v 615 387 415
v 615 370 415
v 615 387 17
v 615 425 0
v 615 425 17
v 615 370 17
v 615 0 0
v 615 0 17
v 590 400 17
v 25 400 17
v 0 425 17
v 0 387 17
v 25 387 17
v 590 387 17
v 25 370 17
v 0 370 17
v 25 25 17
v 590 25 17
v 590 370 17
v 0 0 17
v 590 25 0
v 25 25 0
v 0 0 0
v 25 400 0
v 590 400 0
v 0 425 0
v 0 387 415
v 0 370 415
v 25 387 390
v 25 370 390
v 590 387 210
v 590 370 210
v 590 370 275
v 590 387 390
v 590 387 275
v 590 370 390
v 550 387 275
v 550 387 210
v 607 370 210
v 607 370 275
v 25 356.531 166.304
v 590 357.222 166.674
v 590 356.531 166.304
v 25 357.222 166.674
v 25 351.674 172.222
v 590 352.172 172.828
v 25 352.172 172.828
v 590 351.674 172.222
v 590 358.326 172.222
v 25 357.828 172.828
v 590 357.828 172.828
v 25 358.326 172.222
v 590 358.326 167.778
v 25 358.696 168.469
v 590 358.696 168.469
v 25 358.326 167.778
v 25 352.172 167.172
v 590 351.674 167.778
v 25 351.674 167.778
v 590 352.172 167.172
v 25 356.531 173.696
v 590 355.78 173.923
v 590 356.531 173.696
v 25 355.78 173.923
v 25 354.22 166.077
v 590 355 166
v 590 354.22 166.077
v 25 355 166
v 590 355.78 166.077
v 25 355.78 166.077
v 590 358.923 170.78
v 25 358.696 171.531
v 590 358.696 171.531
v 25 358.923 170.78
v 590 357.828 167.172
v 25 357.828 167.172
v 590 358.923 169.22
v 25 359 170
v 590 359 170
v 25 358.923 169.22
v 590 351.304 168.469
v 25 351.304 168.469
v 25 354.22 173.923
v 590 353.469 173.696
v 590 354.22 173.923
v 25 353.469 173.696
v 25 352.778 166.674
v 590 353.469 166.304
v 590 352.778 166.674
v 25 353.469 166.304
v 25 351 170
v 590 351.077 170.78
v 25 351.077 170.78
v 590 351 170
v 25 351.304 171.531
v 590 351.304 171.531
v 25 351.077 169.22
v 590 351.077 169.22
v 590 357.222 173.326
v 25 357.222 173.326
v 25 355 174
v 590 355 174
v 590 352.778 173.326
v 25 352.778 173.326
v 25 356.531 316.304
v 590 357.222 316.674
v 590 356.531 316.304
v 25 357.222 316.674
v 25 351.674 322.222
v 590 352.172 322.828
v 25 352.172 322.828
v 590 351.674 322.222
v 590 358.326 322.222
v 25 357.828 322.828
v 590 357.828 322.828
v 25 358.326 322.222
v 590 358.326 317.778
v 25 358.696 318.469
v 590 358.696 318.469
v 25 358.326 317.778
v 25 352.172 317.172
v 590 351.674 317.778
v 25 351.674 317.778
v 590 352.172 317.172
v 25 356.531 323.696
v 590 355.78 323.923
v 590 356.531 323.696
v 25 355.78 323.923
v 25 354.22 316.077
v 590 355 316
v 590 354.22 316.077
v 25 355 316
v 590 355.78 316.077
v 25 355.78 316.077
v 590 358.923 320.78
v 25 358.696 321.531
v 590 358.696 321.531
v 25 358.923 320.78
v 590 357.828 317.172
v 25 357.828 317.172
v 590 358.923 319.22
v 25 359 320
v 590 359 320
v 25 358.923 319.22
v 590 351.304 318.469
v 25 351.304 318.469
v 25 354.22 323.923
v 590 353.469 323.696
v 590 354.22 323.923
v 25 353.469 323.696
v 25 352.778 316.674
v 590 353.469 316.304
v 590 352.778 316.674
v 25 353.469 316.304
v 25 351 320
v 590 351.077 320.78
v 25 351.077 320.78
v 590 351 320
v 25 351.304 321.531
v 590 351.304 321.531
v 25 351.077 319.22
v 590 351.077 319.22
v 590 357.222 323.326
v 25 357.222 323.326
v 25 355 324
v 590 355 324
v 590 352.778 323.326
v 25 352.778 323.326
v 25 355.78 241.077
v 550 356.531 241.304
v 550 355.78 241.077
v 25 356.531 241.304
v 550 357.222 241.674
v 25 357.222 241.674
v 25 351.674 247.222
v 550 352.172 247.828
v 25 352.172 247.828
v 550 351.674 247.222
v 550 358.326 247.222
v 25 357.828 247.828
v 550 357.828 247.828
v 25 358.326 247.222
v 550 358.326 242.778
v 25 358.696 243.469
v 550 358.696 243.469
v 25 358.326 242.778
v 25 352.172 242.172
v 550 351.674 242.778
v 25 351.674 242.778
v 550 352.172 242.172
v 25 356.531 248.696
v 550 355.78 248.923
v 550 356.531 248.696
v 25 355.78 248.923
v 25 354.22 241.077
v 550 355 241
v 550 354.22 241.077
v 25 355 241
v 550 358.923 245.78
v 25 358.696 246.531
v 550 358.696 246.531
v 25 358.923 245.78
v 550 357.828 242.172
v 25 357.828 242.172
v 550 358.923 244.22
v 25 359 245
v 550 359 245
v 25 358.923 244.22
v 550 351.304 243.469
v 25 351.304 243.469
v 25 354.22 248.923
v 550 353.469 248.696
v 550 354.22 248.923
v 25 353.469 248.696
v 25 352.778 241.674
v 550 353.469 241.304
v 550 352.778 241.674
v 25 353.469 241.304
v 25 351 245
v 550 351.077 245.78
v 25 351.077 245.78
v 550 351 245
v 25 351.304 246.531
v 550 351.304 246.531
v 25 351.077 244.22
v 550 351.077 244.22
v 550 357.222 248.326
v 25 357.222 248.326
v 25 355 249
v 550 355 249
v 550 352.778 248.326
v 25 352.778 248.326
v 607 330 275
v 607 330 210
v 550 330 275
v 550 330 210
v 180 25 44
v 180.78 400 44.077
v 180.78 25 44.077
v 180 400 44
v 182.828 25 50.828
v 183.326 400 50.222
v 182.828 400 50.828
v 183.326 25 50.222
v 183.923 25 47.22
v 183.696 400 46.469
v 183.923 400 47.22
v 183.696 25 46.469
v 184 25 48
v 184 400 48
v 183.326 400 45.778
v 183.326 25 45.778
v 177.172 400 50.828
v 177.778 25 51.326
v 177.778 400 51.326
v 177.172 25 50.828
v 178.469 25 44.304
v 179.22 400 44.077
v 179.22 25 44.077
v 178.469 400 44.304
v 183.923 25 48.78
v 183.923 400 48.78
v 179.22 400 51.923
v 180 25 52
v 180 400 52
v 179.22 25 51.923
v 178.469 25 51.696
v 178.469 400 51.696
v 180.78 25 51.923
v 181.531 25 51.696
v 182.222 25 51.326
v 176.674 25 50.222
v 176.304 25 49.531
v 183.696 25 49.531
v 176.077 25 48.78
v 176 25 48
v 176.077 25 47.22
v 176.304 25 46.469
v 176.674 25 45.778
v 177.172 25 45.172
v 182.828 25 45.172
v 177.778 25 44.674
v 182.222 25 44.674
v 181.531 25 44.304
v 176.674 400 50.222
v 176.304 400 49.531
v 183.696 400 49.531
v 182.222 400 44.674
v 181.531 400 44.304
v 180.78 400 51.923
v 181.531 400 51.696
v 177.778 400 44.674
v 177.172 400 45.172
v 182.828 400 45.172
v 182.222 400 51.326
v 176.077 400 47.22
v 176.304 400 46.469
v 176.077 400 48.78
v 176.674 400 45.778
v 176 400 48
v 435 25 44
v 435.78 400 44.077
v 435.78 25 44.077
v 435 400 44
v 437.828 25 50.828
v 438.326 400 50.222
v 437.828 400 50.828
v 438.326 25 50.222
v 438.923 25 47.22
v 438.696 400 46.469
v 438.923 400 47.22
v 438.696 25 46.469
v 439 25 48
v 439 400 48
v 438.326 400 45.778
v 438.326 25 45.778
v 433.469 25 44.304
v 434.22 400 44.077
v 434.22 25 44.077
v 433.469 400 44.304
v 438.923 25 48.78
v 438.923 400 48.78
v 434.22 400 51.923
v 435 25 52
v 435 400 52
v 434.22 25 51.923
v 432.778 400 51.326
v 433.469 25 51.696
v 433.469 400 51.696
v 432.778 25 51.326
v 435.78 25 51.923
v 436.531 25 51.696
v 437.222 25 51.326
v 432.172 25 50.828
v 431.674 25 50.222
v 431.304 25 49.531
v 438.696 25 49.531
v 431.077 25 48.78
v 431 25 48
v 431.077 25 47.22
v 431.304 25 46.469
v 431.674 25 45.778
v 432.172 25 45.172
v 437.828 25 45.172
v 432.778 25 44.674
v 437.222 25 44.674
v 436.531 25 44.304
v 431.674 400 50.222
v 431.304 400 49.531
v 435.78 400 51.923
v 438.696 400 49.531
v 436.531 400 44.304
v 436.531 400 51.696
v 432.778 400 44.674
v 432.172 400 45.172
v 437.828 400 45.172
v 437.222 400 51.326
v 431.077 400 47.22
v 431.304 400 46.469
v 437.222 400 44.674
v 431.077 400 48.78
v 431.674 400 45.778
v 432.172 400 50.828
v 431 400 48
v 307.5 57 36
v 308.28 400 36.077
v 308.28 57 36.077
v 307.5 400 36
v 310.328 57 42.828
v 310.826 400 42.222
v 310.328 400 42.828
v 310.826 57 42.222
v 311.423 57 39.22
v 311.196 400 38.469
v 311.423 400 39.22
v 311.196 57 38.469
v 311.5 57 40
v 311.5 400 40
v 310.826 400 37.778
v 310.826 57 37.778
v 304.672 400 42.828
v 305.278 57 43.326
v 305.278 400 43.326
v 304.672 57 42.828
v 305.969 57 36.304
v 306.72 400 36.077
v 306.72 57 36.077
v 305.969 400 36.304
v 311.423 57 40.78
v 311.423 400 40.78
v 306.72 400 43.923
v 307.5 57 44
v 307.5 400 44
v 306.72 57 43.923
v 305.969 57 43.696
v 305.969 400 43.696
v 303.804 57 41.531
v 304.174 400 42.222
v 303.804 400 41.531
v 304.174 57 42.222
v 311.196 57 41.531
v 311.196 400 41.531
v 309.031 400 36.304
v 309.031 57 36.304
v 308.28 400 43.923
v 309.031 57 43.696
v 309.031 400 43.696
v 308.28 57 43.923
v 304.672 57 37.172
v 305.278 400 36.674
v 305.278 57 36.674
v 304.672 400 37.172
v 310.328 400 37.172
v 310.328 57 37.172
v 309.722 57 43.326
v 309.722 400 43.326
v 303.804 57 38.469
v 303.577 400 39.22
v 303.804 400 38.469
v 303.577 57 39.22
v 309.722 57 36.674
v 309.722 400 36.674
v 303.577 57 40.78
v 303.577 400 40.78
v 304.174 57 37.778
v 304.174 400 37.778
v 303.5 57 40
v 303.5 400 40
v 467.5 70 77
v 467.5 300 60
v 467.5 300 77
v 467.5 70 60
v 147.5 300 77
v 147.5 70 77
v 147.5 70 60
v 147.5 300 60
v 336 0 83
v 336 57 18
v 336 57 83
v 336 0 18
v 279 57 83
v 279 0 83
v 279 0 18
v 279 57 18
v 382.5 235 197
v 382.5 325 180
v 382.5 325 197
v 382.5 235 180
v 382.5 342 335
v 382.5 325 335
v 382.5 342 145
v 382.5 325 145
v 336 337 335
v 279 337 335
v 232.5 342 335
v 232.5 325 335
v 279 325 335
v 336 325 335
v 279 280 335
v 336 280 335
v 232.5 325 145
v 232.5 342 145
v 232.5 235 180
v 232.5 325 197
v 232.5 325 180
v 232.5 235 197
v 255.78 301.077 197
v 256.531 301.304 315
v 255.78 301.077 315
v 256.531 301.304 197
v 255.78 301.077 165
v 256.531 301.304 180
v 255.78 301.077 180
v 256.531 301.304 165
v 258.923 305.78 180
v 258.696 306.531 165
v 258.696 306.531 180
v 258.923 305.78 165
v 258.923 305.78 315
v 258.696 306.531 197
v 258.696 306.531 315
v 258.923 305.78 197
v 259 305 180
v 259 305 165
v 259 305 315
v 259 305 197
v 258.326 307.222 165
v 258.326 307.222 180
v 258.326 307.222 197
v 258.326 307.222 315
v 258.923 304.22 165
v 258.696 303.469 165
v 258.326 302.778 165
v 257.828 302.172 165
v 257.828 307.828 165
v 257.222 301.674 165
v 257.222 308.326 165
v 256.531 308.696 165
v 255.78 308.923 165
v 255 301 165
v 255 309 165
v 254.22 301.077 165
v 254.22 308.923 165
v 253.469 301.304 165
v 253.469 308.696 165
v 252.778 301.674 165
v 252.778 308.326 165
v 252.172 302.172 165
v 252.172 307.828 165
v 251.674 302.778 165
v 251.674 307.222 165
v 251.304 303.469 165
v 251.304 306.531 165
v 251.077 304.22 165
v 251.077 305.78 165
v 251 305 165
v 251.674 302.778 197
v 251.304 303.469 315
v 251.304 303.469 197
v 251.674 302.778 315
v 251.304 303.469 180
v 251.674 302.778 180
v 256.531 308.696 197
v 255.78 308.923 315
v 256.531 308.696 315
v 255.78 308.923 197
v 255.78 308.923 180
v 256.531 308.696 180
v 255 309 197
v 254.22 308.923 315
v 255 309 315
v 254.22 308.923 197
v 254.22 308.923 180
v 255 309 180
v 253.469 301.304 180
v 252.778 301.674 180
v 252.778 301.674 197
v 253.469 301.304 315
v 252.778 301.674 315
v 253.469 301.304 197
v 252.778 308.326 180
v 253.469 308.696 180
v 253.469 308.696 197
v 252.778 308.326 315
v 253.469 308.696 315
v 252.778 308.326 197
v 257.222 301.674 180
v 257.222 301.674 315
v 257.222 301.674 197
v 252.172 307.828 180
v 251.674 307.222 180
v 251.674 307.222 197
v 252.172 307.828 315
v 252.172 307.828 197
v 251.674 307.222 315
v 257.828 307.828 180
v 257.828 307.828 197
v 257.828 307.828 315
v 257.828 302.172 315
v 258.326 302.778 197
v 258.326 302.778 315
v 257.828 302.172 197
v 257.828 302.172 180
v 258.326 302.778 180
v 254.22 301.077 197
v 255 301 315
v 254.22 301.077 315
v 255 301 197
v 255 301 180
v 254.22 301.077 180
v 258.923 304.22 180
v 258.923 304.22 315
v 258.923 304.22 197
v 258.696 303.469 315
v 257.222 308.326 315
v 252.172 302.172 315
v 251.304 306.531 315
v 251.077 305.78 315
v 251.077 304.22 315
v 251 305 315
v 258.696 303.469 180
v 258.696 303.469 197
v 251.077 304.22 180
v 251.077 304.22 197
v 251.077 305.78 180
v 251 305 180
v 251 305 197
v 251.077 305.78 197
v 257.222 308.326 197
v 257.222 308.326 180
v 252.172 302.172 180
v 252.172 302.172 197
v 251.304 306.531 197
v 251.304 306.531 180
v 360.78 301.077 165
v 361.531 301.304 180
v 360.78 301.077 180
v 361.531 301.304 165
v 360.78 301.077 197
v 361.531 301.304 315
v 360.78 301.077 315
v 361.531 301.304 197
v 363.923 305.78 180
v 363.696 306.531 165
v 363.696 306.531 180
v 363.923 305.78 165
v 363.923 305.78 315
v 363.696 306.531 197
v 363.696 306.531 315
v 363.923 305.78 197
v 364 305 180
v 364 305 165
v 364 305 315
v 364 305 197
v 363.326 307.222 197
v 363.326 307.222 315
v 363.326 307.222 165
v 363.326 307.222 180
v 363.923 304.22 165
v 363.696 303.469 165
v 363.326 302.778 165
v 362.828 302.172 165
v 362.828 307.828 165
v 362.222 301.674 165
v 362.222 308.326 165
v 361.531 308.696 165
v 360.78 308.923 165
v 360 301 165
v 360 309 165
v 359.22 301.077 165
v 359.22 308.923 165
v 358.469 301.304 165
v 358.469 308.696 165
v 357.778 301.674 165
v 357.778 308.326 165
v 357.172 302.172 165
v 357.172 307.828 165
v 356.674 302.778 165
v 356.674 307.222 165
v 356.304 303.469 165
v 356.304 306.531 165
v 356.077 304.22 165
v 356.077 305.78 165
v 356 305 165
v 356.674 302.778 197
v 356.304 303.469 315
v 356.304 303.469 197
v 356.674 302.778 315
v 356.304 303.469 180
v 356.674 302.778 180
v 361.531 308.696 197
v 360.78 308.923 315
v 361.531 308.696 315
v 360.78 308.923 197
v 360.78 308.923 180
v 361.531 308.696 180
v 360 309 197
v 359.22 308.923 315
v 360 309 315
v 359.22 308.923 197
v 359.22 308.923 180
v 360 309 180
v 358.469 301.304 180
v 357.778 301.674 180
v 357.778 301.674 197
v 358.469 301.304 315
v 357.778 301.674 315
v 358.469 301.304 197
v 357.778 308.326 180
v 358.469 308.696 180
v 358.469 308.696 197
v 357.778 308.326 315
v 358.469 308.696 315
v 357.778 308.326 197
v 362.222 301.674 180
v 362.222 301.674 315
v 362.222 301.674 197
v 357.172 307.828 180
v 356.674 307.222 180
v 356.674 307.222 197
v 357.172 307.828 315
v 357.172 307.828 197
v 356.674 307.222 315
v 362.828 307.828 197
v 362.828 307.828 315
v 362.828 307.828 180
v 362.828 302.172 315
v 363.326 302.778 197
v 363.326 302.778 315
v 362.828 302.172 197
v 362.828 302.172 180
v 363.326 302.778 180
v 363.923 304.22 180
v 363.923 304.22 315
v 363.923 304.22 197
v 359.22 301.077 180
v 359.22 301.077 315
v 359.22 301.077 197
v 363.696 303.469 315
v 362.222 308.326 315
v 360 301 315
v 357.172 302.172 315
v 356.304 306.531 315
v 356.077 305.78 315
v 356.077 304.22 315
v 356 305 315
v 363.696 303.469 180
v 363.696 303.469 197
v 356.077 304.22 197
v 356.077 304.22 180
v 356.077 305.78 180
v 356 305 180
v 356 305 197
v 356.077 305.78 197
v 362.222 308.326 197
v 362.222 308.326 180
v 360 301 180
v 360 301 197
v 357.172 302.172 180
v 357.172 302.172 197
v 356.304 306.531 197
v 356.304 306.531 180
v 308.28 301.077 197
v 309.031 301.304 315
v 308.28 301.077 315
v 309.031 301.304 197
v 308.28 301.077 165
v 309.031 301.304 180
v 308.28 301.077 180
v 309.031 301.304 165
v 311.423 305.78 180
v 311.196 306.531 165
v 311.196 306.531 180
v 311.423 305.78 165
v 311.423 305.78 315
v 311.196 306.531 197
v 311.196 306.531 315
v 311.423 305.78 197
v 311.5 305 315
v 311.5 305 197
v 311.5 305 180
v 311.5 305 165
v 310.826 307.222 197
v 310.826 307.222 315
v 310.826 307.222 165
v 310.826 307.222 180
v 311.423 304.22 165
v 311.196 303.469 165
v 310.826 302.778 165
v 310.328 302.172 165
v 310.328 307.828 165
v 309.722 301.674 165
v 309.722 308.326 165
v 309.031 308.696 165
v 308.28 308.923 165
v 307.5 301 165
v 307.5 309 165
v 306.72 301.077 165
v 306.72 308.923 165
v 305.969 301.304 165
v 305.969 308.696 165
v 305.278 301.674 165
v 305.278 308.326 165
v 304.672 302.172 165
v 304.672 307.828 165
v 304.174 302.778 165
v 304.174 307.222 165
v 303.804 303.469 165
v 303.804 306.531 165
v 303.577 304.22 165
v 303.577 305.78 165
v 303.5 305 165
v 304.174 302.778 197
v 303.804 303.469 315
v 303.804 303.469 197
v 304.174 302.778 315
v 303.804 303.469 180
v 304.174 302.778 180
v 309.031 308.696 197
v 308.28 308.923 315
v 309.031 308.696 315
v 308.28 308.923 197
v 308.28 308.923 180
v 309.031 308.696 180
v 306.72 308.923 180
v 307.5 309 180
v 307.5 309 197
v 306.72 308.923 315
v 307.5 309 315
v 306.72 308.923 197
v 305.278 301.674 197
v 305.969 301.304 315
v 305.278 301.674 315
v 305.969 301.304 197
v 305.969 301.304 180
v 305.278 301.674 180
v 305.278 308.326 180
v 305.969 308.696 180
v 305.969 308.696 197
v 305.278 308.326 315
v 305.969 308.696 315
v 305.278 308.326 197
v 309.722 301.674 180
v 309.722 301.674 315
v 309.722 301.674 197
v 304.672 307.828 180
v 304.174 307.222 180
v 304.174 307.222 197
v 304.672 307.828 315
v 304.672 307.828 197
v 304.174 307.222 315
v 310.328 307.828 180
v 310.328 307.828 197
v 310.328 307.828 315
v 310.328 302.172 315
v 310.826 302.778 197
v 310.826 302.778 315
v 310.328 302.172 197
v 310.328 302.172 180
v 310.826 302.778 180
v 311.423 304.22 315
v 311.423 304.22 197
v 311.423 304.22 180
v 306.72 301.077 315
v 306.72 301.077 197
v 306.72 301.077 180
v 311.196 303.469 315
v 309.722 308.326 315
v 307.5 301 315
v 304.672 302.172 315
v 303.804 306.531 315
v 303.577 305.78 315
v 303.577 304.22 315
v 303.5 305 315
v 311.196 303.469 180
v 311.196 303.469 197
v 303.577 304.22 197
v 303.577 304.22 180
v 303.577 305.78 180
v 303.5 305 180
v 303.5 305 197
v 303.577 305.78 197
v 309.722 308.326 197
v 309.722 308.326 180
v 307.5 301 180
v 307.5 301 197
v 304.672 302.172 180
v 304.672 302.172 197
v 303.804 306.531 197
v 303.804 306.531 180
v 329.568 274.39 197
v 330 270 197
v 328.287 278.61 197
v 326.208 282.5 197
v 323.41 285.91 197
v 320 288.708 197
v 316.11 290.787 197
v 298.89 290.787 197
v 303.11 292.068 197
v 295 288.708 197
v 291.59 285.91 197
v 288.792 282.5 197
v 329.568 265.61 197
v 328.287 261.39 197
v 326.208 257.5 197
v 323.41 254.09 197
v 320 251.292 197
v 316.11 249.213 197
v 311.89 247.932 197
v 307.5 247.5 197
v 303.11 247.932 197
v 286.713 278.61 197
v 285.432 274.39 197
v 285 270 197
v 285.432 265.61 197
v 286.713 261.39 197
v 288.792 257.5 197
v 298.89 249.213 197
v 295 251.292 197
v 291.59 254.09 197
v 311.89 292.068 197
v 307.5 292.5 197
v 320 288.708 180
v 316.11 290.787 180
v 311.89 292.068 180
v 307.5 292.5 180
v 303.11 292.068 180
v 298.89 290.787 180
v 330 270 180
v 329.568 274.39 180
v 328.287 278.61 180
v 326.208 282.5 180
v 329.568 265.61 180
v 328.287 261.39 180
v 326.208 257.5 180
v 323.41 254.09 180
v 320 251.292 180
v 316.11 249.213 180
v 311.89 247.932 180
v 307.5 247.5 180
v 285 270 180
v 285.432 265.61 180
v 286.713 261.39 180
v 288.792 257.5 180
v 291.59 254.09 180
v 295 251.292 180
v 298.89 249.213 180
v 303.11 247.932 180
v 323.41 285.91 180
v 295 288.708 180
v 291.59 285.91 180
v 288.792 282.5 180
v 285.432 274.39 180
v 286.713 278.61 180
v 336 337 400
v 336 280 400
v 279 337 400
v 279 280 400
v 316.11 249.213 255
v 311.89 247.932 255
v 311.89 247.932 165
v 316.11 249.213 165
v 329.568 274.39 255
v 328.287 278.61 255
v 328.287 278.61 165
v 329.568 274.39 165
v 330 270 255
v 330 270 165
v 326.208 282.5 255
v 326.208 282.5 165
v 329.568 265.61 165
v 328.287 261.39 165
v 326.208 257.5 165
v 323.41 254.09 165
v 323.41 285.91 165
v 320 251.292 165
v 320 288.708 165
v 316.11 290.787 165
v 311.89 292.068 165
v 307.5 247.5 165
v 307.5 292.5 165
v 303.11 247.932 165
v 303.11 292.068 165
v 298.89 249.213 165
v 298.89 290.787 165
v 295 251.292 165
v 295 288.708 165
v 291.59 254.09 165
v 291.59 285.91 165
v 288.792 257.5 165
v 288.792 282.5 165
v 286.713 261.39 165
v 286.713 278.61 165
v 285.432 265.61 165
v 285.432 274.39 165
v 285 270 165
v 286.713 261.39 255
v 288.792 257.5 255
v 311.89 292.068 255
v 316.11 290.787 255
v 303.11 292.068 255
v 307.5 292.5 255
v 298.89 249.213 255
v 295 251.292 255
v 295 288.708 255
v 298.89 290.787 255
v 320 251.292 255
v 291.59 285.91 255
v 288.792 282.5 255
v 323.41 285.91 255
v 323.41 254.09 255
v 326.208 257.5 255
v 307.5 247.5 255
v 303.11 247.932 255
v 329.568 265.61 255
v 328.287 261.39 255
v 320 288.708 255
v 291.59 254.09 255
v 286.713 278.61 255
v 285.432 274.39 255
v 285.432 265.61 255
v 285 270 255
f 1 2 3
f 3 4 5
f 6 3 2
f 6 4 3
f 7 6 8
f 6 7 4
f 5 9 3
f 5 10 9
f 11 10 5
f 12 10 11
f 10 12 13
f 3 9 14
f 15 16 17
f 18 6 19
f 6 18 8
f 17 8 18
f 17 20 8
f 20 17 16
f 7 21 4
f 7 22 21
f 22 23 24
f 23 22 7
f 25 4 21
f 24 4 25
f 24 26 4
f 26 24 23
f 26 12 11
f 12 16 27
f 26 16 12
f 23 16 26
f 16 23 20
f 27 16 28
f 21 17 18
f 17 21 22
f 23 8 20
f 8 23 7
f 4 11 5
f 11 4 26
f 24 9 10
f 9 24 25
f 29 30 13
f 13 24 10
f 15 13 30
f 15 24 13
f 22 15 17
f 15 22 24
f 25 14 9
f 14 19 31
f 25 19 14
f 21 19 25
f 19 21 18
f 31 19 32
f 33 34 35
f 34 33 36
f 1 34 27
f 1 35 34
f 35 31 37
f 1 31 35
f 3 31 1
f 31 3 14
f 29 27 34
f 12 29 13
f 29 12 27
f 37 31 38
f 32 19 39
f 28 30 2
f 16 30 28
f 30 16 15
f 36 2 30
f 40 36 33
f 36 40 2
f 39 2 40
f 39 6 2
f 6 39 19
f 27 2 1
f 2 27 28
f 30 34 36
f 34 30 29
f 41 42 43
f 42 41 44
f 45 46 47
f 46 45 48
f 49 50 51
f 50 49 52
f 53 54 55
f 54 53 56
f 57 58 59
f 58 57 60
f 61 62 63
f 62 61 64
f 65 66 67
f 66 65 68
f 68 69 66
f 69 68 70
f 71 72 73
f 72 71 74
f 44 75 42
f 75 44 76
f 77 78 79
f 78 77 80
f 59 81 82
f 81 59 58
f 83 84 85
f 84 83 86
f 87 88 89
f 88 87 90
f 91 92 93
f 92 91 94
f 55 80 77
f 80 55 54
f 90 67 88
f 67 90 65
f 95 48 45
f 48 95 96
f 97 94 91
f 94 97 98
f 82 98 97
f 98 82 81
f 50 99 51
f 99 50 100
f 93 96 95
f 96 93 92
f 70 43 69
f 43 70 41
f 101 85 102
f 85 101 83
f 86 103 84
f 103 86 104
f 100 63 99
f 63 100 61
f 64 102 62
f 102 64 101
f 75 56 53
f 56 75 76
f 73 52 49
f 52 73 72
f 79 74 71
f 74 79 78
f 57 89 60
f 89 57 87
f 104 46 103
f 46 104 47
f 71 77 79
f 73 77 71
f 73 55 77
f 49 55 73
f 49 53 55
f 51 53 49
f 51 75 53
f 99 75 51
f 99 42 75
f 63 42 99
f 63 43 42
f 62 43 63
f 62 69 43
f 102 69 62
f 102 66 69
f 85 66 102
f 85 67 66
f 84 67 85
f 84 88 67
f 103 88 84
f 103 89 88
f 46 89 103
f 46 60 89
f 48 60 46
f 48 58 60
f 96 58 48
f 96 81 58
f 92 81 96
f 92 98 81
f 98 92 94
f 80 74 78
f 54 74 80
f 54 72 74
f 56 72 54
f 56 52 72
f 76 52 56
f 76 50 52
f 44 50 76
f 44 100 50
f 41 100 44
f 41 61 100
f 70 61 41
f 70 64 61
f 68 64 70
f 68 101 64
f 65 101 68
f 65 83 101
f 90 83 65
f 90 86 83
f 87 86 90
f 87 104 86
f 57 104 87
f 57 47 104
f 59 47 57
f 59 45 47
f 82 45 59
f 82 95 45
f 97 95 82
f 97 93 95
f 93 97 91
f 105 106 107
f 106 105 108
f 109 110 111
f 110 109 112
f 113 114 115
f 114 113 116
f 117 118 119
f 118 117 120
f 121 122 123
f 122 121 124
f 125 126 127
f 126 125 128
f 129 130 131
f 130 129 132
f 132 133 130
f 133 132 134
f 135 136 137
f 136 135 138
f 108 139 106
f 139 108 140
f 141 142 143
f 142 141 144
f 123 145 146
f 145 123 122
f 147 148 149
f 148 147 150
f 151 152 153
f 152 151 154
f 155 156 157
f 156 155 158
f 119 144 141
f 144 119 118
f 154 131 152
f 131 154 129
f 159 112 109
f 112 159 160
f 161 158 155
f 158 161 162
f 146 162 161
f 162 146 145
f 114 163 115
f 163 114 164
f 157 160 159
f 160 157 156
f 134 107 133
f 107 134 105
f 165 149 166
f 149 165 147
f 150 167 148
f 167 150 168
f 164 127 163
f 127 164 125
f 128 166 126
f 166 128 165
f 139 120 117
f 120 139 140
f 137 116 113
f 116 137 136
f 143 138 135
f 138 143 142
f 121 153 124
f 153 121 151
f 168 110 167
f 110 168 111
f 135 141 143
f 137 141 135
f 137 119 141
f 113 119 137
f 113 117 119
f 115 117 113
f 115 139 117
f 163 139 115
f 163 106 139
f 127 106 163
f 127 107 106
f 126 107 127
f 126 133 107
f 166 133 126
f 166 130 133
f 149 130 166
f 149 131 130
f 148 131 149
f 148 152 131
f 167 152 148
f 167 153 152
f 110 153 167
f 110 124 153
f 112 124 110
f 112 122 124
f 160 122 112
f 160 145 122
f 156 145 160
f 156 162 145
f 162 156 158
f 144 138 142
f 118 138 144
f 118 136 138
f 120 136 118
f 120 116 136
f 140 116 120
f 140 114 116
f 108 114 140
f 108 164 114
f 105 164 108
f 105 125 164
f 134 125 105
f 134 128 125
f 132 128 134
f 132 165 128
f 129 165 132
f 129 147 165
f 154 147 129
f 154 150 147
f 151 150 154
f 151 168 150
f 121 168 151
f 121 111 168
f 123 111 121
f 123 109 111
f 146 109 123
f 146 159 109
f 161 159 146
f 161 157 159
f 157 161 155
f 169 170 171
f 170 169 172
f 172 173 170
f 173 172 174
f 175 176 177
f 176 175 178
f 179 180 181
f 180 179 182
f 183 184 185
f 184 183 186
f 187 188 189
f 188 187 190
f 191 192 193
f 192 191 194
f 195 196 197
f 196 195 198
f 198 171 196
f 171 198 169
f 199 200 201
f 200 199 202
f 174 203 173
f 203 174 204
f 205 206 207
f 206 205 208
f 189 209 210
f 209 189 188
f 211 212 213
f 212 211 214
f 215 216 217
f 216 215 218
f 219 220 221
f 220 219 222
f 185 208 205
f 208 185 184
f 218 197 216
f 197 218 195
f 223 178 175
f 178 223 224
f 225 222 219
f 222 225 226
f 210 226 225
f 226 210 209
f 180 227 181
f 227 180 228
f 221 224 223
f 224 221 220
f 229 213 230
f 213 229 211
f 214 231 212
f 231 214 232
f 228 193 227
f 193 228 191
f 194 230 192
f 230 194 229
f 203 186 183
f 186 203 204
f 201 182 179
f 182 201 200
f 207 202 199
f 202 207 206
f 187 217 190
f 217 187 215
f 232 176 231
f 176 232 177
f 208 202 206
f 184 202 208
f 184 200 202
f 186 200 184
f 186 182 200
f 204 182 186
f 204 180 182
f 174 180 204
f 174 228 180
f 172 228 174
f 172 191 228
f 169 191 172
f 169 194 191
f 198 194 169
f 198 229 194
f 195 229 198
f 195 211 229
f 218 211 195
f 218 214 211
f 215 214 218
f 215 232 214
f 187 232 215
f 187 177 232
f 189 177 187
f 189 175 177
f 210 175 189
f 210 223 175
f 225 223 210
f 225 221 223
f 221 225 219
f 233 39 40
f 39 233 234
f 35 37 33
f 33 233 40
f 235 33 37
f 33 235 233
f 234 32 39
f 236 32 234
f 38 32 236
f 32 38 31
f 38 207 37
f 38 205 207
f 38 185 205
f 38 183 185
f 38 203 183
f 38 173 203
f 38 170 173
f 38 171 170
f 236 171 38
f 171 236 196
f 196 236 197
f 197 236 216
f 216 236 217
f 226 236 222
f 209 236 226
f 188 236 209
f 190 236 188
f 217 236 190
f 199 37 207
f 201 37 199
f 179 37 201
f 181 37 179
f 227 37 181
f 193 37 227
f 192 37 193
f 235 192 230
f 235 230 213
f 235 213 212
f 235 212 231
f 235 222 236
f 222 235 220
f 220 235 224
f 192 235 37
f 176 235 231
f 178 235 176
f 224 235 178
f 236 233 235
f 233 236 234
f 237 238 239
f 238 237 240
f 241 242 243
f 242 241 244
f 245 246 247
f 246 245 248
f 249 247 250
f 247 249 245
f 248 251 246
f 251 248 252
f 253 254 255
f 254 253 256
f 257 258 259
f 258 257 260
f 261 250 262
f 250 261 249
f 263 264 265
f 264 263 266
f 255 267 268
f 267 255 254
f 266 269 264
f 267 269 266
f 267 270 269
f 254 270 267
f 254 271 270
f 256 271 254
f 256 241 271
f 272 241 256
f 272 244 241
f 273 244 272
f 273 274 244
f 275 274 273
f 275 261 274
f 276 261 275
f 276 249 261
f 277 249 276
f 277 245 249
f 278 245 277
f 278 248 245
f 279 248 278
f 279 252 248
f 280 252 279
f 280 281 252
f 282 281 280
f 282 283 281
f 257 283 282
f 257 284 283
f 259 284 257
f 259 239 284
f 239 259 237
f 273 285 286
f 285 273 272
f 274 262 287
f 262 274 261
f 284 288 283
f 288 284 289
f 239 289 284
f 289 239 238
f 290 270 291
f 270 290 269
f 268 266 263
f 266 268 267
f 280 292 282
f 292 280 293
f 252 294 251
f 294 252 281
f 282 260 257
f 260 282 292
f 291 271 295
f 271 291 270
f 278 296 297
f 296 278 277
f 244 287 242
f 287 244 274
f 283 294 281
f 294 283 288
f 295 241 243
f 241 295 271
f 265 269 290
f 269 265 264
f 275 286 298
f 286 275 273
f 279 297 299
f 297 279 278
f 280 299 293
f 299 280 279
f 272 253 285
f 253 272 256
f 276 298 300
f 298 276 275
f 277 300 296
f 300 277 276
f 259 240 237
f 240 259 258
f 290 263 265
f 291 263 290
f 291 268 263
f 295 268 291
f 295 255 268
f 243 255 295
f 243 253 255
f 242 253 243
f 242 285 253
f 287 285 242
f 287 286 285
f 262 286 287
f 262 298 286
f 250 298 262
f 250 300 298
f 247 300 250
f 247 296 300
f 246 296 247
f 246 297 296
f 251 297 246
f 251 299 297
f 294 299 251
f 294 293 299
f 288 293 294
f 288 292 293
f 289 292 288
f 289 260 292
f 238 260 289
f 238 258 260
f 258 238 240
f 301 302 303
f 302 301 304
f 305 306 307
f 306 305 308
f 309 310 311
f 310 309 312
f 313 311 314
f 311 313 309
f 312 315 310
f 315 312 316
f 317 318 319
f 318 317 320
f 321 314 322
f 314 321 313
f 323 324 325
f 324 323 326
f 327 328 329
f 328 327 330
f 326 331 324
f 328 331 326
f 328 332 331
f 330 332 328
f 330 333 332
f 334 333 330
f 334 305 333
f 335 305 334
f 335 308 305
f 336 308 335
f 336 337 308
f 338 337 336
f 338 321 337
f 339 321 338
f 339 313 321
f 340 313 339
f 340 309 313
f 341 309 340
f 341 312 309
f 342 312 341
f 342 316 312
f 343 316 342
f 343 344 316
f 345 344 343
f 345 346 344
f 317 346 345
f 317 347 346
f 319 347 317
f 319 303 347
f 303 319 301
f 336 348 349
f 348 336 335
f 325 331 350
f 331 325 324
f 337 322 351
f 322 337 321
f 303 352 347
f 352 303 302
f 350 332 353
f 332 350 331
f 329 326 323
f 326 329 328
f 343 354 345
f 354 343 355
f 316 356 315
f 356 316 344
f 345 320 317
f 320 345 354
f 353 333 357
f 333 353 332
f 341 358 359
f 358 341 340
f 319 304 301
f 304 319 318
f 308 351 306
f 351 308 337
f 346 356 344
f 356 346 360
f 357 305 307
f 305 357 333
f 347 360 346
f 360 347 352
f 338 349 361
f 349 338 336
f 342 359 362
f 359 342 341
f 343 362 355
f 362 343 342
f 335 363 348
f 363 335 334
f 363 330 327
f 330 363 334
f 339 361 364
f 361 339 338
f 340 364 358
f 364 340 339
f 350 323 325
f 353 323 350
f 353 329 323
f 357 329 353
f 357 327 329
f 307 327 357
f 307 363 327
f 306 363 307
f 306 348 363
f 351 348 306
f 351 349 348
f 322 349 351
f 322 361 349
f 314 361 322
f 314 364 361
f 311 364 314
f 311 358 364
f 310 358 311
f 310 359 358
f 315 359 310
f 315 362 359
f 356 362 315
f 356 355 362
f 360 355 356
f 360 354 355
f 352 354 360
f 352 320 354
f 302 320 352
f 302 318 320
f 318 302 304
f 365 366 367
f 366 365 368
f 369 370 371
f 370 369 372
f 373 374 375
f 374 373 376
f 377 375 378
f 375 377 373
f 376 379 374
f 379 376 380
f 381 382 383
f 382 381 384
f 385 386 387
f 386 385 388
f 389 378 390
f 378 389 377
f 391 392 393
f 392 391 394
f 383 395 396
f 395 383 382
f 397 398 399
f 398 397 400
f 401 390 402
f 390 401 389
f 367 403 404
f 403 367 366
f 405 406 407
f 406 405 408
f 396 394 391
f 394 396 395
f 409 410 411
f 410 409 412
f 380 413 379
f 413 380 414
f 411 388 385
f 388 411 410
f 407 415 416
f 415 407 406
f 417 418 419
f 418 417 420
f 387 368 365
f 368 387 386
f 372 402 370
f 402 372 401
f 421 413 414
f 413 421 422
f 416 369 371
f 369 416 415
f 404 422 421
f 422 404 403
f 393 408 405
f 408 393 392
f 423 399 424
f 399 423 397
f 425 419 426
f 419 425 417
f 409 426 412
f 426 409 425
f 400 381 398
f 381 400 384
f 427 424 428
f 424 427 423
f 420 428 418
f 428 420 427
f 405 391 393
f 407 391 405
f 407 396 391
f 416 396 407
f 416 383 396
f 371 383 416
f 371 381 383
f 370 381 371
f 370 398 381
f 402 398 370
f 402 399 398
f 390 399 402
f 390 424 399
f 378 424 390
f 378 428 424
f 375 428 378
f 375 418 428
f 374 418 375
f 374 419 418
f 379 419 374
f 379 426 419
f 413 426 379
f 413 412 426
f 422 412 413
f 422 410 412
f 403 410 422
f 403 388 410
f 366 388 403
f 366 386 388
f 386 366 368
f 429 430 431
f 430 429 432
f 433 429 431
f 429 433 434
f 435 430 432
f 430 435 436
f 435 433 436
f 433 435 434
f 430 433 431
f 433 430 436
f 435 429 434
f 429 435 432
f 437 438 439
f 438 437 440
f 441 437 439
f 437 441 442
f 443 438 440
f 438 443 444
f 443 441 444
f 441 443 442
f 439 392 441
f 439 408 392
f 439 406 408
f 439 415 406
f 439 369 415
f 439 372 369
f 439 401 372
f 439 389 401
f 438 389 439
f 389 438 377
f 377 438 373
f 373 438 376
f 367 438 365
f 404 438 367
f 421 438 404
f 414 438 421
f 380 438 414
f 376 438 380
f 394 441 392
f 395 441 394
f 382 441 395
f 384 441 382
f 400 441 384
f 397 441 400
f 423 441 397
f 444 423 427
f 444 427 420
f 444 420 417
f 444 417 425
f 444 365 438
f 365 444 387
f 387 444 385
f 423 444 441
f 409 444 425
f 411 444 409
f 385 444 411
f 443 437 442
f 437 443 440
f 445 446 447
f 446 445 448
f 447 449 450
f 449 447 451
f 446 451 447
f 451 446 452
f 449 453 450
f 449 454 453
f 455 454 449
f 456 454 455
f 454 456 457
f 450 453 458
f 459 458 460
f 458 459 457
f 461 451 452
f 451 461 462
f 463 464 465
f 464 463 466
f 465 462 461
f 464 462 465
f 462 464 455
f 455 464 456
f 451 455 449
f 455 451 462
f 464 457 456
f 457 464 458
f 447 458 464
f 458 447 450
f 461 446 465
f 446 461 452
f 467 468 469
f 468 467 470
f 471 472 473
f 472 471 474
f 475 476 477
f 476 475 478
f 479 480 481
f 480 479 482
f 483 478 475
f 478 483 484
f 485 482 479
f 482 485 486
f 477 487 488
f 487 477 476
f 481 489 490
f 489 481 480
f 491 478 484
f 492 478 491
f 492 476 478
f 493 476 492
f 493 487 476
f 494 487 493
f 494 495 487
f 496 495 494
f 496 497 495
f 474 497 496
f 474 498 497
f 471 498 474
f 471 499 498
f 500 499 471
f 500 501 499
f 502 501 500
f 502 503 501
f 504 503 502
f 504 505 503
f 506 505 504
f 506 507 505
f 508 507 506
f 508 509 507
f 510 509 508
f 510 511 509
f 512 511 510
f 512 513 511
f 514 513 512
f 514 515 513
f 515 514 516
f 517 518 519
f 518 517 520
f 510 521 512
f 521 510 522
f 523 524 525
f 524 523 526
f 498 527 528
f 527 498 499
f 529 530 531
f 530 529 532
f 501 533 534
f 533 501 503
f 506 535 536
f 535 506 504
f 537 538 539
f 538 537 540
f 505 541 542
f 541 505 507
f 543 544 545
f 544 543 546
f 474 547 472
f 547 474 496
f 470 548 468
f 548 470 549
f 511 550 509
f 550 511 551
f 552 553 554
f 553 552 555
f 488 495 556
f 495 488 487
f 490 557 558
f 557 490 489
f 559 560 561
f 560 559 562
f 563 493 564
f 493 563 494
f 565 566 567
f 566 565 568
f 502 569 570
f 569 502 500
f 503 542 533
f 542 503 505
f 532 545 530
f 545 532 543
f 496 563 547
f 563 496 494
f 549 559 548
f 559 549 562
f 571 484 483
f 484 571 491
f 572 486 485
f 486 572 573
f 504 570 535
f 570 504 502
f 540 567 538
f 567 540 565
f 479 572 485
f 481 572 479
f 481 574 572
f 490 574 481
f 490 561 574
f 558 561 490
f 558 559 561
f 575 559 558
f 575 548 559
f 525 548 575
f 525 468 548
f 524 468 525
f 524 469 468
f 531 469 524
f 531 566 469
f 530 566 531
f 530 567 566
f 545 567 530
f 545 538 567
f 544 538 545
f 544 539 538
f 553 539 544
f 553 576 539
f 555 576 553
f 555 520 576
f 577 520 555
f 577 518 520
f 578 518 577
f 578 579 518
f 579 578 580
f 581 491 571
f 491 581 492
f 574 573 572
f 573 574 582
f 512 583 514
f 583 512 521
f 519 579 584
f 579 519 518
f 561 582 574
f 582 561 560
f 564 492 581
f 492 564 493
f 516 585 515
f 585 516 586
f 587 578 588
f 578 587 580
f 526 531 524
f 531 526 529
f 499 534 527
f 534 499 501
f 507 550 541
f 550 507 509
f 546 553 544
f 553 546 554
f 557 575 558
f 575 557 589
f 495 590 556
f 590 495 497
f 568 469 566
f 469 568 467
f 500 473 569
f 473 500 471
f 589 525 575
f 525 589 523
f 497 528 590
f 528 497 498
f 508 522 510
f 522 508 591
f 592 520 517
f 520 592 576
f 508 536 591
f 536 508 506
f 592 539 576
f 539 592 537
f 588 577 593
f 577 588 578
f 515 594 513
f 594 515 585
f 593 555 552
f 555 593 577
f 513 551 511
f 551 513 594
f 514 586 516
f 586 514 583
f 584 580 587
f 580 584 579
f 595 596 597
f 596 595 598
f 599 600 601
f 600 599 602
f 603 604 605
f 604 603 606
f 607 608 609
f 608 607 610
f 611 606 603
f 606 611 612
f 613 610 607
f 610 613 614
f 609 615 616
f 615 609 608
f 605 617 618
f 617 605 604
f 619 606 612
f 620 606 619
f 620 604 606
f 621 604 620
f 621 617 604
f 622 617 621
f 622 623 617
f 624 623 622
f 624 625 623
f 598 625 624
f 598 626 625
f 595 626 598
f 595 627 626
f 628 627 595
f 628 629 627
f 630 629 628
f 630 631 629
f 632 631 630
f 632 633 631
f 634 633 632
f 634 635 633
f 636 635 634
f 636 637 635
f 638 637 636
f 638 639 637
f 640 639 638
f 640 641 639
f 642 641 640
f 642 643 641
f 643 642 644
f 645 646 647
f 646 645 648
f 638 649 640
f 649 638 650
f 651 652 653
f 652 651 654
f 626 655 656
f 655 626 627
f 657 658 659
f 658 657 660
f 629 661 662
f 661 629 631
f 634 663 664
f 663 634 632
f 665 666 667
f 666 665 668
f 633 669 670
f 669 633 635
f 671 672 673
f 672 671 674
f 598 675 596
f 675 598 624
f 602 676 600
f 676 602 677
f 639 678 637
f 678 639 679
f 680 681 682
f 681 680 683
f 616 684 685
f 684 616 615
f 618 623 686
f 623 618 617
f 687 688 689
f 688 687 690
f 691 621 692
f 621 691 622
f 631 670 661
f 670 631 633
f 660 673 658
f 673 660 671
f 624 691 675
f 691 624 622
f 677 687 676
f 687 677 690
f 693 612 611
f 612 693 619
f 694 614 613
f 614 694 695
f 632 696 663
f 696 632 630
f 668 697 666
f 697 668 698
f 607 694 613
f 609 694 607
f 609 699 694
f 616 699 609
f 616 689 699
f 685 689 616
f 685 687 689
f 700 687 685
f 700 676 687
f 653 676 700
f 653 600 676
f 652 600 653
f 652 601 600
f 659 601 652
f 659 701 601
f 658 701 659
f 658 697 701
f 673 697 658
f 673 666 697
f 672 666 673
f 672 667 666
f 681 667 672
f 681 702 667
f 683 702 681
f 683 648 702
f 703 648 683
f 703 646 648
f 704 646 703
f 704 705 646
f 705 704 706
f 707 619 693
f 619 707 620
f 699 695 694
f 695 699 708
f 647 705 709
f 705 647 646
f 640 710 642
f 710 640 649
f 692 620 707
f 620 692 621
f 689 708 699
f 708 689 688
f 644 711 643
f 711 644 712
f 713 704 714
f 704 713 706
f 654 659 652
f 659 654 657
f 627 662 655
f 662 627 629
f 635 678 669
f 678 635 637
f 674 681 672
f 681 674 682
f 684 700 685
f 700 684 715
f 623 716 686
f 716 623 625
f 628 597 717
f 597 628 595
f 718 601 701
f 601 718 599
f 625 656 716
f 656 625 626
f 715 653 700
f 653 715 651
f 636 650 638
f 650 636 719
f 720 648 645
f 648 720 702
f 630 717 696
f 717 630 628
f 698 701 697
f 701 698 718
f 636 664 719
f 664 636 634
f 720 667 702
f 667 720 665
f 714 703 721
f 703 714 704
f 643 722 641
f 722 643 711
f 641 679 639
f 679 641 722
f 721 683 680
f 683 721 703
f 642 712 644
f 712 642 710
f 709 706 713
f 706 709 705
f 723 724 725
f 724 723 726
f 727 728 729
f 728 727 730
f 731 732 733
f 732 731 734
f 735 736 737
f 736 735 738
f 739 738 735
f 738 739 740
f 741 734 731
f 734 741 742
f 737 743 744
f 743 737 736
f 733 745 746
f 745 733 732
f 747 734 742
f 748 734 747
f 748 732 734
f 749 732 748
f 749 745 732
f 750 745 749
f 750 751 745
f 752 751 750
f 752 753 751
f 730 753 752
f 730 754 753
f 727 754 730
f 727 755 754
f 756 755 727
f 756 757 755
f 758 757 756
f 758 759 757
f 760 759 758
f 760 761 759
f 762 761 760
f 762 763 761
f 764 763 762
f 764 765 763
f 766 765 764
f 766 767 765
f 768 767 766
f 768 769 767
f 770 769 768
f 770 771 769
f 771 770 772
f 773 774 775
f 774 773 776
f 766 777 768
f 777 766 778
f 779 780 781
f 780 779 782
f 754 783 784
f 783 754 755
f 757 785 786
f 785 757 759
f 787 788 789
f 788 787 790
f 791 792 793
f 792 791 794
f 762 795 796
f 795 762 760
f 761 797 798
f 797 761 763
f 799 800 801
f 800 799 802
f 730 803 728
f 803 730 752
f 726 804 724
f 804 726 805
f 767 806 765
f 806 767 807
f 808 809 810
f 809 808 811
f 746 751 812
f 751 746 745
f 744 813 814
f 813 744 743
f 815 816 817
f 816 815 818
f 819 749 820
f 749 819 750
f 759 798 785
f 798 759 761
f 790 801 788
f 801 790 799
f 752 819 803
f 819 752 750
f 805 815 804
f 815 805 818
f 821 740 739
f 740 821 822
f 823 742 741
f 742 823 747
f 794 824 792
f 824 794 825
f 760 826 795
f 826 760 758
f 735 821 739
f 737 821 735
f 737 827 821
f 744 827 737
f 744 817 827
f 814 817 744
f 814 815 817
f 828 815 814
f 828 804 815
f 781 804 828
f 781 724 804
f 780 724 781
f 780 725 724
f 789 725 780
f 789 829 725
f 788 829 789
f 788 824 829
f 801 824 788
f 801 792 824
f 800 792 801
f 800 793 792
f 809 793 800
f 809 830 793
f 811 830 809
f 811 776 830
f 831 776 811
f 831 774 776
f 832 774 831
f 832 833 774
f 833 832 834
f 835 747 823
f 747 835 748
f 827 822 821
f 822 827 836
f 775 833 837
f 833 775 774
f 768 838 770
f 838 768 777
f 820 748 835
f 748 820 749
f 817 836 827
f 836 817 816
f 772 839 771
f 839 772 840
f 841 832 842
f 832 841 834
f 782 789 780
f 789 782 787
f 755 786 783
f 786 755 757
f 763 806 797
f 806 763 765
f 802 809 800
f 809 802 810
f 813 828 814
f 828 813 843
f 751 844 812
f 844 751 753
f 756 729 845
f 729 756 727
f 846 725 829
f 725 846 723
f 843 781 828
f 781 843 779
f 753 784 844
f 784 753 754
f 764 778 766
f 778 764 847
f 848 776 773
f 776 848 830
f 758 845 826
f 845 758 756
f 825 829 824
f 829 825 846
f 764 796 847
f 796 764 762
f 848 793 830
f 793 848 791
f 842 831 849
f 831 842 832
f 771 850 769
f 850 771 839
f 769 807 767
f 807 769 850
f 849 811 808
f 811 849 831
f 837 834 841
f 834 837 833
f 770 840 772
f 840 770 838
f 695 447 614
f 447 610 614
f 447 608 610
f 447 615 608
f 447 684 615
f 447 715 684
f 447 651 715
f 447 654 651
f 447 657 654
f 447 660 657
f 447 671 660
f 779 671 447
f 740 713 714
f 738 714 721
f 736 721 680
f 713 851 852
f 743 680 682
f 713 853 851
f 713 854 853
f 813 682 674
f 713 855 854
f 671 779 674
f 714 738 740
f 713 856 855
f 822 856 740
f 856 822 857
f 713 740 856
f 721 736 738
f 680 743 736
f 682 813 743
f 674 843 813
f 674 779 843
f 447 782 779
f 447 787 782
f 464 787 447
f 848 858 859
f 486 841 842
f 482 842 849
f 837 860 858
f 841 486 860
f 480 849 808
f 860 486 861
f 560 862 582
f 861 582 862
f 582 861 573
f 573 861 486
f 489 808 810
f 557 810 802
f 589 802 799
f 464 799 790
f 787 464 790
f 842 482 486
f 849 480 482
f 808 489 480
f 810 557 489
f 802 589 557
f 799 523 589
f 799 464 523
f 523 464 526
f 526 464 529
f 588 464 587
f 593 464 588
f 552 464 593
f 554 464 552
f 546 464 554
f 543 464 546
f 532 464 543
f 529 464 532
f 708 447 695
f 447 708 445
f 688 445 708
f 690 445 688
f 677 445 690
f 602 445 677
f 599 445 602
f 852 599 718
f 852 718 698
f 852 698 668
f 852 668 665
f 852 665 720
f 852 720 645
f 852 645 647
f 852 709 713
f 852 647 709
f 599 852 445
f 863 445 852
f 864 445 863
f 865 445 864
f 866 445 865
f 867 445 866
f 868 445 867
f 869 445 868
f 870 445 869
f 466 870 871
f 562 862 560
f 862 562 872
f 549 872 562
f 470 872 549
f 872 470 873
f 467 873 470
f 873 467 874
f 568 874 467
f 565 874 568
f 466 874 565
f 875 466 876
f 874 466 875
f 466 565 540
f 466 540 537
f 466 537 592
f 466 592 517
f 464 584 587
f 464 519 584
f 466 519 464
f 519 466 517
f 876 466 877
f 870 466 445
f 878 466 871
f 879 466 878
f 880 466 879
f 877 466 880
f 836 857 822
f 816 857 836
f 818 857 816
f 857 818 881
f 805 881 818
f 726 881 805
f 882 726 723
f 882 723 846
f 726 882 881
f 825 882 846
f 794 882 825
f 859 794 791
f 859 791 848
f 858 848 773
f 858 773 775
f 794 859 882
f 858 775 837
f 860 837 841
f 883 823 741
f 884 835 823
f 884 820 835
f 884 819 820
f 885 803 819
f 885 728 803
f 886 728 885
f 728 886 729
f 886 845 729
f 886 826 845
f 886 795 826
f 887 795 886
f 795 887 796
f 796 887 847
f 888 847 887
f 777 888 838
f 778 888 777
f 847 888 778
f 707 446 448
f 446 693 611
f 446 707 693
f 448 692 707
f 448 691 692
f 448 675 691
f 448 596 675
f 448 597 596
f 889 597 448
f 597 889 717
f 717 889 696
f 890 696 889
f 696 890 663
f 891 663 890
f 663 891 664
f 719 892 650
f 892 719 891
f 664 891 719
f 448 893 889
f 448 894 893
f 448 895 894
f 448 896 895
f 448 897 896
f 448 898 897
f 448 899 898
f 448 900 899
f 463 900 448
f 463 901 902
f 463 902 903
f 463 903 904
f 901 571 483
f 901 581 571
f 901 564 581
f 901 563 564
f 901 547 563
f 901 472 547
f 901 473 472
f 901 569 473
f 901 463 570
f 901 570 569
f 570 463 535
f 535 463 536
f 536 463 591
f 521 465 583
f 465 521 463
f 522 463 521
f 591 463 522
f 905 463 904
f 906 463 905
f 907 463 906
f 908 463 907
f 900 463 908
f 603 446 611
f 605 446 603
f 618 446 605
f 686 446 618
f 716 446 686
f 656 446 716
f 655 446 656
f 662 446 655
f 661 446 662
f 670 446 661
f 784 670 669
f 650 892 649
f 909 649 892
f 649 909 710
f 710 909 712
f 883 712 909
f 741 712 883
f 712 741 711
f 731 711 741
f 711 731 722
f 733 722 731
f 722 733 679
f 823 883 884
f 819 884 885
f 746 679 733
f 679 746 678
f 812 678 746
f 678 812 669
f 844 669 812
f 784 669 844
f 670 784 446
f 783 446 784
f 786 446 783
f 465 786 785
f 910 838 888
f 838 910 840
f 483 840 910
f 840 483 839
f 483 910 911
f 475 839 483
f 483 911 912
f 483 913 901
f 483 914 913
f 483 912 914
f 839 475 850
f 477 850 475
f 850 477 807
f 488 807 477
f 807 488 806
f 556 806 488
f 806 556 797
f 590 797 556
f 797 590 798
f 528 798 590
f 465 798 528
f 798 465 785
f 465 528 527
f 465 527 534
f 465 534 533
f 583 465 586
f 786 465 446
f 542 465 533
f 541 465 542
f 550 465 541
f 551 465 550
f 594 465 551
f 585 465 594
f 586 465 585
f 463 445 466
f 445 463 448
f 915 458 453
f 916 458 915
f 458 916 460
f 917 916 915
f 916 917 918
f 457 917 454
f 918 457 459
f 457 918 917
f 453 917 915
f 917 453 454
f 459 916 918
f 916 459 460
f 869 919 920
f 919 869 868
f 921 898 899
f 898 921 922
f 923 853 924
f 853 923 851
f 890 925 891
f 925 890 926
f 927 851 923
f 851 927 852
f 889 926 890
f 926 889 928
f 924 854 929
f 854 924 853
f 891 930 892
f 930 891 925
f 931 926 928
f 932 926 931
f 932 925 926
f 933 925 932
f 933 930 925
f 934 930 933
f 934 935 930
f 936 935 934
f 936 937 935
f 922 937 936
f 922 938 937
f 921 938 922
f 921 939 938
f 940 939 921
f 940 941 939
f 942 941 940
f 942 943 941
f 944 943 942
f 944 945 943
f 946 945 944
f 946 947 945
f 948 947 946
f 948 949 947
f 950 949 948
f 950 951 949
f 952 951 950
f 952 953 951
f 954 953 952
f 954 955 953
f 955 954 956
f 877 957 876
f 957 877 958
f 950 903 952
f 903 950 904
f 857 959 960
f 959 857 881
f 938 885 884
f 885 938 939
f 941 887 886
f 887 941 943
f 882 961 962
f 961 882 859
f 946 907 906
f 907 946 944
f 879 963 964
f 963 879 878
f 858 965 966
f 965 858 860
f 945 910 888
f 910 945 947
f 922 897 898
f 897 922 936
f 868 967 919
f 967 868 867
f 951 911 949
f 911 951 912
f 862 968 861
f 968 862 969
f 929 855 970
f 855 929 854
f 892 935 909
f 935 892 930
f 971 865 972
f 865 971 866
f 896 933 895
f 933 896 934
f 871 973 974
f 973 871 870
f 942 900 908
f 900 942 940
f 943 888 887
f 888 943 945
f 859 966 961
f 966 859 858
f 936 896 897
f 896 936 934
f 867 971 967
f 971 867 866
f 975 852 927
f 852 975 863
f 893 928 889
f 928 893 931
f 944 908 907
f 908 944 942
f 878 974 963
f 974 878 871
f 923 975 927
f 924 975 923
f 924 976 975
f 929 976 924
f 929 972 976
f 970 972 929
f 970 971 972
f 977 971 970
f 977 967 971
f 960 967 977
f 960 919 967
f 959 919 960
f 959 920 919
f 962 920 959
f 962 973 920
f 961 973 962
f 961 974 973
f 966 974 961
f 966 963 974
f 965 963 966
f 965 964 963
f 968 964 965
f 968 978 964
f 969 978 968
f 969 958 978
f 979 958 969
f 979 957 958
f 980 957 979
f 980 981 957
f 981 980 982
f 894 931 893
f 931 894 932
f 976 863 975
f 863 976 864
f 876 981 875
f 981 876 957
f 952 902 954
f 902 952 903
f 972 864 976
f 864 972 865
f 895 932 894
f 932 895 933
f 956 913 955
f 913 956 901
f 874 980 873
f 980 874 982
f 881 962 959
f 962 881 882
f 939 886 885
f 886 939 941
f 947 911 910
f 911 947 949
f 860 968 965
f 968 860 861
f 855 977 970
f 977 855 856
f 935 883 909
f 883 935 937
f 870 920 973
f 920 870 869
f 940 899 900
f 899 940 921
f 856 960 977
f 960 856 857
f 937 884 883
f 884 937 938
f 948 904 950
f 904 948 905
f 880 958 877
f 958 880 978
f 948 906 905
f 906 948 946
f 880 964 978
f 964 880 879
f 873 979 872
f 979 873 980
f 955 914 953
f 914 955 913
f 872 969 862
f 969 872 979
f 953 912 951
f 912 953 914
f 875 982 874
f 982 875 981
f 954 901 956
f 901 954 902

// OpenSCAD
// Millimetres
$fn = 32;
base_width = 615;
base_depth = 425;
upright_height = 390;
board = 17;
base_rail = 25;
rail_d = 8;
table_offset = 0;
carriage_offset = 0;

module beam(size, position) {
    color([0.66, 0.46, 0.26]) translate(position) cube(size);
}
module rod(length, position, rotation) {
    color("silver") translate(position) rotate(rotation) cylinder(h=length, d=rail_d);
}
module motor(position) {
    // Illustrative 57 mm envelope; not a verified part model.
    color([0.18,0.19,0.21]) translate(position) cube([57,57,65]);
}
module base() {
    beam([base_width,base_rail,board],[0,0,0]);
    beam([base_width,base_rail,board],[0,base_depth-base_rail,0]);
    beam([base_rail,base_depth,board],[0,0,0]);
    beam([base_rail,base_depth,board],[base_width-base_rail,0,0]);
}
module gantry() {
    beam([base_rail,board,upright_height],[0,base_depth-55,board]);
    beam([base_rail,board,upright_height],[base_width-base_rail,base_depth-55,board]);
    beam([base_width,board,base_rail],[0,base_depth-55,upright_height]);
    rod(base_width-50,[25,base_depth-70,170],[0,90,0]);
    rod(base_width-50,[25,base_depth-70,320],[0,90,0]);
    rod(base_width-50,[25,base_depth-70,245],[0,90,0]); // screw represented as rod
    motor([base_width-65,base_depth-95,210]);
}
module table() {
    rod(base_depth-50,[180,25,48],[-90,0,0]);
    rod(base_depth-50,[435,25,48],[-90,0,0]);
    rod(base_depth-50,[307.5,25,40],[-90,0,0]);
    beam([320,230,17],[147.5,70+table_offset,60]);
    motor([279,0,18]);
}
module carriage() {
    translate([carriage_offset,0,0]) {
        beam([150,17,190],[232.5,base_depth-100,145]);
        rod(150,[255,base_depth-120,165],[0,0,0]);
        rod(150,[360,base_depth-120,165],[0,0,0]);
        rod(150,[307.5,base_depth-120,165],[0,0,0]);
        beam([150,95,17],[232.5,base_depth-190,180]);
        motor([279,base_depth-145,335]);
        color("teal") translate([307.5,base_depth-155,165]) cylinder(h=90,d=45);
    }
}
base();
gantry();
table();
carriage();
